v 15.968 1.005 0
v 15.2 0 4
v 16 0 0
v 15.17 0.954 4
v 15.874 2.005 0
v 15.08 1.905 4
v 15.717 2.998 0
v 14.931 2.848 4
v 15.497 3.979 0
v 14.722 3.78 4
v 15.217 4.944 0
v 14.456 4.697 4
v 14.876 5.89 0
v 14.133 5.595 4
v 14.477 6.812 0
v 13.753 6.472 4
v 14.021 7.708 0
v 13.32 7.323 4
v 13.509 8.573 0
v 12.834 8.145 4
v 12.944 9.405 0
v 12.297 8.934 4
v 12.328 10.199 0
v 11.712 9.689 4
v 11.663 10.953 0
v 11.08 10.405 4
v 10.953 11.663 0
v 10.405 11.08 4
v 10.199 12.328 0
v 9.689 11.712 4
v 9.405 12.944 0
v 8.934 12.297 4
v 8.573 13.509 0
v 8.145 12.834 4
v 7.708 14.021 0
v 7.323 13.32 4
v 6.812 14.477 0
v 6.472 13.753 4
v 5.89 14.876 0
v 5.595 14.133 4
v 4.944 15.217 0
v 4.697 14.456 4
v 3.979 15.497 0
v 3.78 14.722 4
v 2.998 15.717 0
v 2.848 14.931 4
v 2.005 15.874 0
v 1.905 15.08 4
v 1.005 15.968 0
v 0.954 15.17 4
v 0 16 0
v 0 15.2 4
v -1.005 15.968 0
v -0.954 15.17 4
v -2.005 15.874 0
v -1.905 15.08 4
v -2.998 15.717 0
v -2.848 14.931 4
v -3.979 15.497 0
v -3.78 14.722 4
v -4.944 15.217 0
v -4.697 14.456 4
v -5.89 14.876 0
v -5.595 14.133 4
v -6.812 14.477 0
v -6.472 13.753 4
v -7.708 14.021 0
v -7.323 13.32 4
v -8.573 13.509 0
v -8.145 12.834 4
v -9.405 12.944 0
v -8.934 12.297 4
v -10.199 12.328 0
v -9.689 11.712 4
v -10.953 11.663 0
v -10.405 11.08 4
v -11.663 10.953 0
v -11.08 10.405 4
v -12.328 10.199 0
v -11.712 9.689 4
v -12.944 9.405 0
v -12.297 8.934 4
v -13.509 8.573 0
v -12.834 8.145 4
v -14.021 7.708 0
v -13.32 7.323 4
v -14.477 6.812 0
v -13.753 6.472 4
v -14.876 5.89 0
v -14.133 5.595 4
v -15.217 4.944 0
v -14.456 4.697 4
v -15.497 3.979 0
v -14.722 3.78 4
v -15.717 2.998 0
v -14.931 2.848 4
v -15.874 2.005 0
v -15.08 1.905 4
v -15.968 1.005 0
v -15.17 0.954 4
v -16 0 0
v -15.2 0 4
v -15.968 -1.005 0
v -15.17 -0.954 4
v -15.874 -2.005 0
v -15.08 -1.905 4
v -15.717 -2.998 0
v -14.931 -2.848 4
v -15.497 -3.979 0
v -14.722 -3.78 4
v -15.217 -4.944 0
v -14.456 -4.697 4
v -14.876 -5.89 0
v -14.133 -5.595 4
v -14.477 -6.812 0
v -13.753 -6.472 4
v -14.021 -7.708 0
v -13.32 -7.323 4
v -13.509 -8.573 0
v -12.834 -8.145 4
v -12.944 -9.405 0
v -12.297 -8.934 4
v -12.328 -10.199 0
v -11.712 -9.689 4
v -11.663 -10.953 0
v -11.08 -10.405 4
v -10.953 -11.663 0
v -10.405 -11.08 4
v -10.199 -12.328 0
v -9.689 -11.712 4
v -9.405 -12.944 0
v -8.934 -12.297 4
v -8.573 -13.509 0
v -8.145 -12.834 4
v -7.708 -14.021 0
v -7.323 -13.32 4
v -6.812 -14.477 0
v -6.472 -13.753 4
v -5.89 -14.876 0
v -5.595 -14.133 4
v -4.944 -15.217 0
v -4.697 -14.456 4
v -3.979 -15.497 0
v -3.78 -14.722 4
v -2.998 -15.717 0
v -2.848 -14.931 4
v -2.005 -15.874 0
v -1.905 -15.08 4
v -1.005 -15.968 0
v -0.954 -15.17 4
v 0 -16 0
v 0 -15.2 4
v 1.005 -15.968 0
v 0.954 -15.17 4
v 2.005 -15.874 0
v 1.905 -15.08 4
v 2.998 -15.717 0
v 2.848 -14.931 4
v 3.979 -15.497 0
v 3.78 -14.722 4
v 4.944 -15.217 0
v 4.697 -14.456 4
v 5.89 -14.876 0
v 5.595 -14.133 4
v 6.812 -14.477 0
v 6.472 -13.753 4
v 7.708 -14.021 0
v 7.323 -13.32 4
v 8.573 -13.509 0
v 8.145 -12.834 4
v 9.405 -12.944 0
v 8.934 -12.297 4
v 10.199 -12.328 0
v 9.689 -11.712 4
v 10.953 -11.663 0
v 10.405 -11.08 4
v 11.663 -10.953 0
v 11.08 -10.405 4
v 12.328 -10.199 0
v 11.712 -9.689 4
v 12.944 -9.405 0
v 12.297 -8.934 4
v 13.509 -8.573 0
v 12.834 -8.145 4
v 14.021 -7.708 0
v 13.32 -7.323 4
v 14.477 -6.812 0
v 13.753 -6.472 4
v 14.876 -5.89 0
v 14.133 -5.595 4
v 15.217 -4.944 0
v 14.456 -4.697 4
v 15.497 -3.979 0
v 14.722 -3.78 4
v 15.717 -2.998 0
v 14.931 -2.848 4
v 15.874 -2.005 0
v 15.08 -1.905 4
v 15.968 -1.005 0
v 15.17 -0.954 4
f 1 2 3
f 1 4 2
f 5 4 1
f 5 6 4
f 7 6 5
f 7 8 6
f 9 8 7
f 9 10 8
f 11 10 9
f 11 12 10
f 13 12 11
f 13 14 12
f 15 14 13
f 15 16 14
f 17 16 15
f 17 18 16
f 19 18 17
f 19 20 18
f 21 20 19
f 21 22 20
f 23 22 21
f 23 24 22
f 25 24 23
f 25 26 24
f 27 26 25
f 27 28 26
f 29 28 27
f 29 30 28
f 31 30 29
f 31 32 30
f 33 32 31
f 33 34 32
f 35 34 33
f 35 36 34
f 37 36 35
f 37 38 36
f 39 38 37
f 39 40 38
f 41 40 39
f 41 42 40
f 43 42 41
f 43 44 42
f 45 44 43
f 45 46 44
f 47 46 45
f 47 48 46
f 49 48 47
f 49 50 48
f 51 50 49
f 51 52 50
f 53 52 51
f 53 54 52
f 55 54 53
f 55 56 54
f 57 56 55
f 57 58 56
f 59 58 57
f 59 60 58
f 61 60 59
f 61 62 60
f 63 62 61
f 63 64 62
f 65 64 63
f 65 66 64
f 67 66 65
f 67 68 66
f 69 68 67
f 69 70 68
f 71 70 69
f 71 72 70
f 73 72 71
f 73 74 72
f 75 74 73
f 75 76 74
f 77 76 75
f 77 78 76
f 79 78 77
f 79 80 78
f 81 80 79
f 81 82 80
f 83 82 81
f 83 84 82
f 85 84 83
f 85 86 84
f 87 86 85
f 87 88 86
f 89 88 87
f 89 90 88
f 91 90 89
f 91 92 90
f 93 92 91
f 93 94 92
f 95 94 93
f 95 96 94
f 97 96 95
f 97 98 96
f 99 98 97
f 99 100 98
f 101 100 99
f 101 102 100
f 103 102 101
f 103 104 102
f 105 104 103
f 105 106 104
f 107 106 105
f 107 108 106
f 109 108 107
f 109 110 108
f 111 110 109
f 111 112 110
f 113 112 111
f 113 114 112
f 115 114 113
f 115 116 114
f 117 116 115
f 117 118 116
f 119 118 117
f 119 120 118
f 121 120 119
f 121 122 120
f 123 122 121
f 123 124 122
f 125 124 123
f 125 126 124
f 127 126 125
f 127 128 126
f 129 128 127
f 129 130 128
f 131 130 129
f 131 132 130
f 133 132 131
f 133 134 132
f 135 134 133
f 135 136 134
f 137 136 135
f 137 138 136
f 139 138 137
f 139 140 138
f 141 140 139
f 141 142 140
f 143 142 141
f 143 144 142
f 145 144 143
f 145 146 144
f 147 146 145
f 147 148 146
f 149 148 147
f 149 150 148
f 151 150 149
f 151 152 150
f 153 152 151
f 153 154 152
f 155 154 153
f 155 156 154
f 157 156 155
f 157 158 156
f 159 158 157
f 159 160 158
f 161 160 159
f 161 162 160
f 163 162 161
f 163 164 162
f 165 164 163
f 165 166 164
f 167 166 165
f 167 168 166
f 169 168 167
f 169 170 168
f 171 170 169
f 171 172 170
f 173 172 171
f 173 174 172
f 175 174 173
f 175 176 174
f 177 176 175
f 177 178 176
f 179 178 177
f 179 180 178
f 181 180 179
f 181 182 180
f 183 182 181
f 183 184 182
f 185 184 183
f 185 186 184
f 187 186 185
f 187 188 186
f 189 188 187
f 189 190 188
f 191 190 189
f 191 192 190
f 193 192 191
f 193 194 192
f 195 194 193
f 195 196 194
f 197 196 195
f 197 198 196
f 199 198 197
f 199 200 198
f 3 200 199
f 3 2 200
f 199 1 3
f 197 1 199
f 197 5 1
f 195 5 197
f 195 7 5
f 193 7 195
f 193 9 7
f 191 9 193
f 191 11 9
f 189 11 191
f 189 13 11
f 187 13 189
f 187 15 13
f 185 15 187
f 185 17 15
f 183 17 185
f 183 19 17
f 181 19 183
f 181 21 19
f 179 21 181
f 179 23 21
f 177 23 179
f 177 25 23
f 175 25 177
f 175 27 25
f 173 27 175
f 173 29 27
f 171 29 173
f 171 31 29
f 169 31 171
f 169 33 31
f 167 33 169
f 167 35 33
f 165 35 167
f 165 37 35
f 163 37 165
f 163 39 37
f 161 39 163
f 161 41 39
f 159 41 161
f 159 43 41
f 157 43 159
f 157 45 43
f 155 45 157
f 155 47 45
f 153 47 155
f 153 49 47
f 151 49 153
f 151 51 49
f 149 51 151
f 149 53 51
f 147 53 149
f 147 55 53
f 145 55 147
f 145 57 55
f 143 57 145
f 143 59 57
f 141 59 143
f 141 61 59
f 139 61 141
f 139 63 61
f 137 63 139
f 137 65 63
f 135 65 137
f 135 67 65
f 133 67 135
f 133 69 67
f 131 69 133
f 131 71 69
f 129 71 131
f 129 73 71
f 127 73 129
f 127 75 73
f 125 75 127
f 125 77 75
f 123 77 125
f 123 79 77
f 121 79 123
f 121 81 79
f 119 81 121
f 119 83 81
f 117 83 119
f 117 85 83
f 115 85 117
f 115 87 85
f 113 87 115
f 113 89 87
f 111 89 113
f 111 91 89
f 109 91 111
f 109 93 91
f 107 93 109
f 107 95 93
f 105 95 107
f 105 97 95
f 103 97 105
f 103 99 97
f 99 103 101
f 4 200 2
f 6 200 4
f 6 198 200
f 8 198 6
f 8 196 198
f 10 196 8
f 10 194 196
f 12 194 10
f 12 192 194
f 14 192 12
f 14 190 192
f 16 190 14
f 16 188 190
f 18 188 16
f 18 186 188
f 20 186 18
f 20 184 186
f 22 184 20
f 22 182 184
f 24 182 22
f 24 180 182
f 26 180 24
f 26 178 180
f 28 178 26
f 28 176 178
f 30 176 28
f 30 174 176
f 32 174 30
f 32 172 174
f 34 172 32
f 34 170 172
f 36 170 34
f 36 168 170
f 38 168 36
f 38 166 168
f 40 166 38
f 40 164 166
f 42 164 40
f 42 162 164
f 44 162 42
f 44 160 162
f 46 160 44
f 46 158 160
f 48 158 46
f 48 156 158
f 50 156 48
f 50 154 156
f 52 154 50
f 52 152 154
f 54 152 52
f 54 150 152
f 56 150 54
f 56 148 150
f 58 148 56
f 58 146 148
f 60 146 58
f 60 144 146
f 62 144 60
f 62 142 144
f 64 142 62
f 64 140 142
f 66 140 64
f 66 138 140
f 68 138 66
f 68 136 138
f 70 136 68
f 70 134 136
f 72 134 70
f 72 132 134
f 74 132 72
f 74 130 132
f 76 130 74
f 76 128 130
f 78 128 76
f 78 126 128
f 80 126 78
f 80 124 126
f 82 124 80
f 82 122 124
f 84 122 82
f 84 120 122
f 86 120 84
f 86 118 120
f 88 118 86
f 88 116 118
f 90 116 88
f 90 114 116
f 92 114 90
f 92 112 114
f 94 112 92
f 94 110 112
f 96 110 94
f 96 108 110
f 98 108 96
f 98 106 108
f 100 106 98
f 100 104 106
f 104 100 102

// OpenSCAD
// file: ../build.scad
$build_id = "";

function building(filename) = is_undef(filename) ?
  !is_undef(build)
  : !is_undef(build) && build == filename;

function previewing() = !building();

module build(filename) {
  $build_id = filename;

  if(!is_undef(scad_build_scan) && scad_build_scan == true) {
    echo(str("scad_build_scan: ", filename));
  }
  else if(previewing() || build == filename) {
    children();
  }
}

module preview_row(spacing) {
  if(previewing()) {
    for(x = [0:1:$children - 1]) {
      translate([x * spacing, 0, 0]) {
        children(x);
      }
    }
  }
  else {
    children();
  }
}

module preview_column(spacing) {
  if(previewing()) {
    for(y = [0:1:$children - 1]) {
      translate([0, y * spacing, 0]) {
        children(y);
      }
    }
  }
  else {
    children();
  }
}
// file: ../minibase.scad
// Based off of titancraft's Customizable Miniature Base (CC0 1.0)
// https://www.thingiverse.com/thing:1112237

include <./build.scad>

$base_rim = 1; //	[1: tapered, 2: inclined, 3: flat]
// Number of sides:
$base_shape = 100; //	[30:Low-res Circle, 100: Hi-res Circle, 5:Pentagon, 6:Hexagon, 8:Octagon, 4:Square, 3:Triangle]

$base_diameter = 32;
$base_height = 4;
$base_slant = 95;

// Percentage:
$base_stretch = 100;

//(tapered base only)
$base_inner_circle_ratio = 40;

module tapered(r=40) {
  $base_rim = 1;
  $base_inner_circle_ratio = r;

  children();
}

module inclined() {
  $base_rim = 2;

  children();
}

module flat() {
  $base_rim = 3;

  children();
}

module shape(s) {
  $base_shape = s;

  children();
}

module diameter(d) {
  $base_diameter = d;

  children();
}

module height(h) {
  $base_height = h;

  children();
}

module slant(s) {
  $base_slant = s;

  children();
}

module stretch(s) {
  $base_stretch = s;

  children();
}

module base(id) {
  build(id) union() {
    radius = $base_diameter/2;
    scale([$base_stretch/100, 1, 1]){
      if ($base_rim == 1){
        // tapered base
        cyl1_height = $base_height * (1-$base_inner_circle_ratio/100);
        cylinder(cyl1_height, radius, radius * $base_slant/100, $fn=$base_shape);

        cyl2_radius = radius  * $base_slant/100 * .95;
        cyl2_height = $base_height - cyl1_height;

        translate([0, 0, cyl1_height]){
          cylinder(cyl2_height, cyl2_radius, cyl2_radius * $base_slant/100, $fn=$base_shape);
          cylinder(cyl2_height*.5, radius * $base_slant/100, cyl2_radius, $fn=$base_shape);
        }
      } else if ($base_rim == 2){
        // inclined base
        cylinder($base_height, radius, radius * $base_slant/100, $fn=$base_shape);
      } else if ($base_rim == 3){
        // flat base

        cylinder($base_height, radius, radius, $fn=$base_shape);
      }
    }
  }
}
// main file
include <../minibase.scad>

inclined() diameter(32) base("32mm-oprgw-infantry");
